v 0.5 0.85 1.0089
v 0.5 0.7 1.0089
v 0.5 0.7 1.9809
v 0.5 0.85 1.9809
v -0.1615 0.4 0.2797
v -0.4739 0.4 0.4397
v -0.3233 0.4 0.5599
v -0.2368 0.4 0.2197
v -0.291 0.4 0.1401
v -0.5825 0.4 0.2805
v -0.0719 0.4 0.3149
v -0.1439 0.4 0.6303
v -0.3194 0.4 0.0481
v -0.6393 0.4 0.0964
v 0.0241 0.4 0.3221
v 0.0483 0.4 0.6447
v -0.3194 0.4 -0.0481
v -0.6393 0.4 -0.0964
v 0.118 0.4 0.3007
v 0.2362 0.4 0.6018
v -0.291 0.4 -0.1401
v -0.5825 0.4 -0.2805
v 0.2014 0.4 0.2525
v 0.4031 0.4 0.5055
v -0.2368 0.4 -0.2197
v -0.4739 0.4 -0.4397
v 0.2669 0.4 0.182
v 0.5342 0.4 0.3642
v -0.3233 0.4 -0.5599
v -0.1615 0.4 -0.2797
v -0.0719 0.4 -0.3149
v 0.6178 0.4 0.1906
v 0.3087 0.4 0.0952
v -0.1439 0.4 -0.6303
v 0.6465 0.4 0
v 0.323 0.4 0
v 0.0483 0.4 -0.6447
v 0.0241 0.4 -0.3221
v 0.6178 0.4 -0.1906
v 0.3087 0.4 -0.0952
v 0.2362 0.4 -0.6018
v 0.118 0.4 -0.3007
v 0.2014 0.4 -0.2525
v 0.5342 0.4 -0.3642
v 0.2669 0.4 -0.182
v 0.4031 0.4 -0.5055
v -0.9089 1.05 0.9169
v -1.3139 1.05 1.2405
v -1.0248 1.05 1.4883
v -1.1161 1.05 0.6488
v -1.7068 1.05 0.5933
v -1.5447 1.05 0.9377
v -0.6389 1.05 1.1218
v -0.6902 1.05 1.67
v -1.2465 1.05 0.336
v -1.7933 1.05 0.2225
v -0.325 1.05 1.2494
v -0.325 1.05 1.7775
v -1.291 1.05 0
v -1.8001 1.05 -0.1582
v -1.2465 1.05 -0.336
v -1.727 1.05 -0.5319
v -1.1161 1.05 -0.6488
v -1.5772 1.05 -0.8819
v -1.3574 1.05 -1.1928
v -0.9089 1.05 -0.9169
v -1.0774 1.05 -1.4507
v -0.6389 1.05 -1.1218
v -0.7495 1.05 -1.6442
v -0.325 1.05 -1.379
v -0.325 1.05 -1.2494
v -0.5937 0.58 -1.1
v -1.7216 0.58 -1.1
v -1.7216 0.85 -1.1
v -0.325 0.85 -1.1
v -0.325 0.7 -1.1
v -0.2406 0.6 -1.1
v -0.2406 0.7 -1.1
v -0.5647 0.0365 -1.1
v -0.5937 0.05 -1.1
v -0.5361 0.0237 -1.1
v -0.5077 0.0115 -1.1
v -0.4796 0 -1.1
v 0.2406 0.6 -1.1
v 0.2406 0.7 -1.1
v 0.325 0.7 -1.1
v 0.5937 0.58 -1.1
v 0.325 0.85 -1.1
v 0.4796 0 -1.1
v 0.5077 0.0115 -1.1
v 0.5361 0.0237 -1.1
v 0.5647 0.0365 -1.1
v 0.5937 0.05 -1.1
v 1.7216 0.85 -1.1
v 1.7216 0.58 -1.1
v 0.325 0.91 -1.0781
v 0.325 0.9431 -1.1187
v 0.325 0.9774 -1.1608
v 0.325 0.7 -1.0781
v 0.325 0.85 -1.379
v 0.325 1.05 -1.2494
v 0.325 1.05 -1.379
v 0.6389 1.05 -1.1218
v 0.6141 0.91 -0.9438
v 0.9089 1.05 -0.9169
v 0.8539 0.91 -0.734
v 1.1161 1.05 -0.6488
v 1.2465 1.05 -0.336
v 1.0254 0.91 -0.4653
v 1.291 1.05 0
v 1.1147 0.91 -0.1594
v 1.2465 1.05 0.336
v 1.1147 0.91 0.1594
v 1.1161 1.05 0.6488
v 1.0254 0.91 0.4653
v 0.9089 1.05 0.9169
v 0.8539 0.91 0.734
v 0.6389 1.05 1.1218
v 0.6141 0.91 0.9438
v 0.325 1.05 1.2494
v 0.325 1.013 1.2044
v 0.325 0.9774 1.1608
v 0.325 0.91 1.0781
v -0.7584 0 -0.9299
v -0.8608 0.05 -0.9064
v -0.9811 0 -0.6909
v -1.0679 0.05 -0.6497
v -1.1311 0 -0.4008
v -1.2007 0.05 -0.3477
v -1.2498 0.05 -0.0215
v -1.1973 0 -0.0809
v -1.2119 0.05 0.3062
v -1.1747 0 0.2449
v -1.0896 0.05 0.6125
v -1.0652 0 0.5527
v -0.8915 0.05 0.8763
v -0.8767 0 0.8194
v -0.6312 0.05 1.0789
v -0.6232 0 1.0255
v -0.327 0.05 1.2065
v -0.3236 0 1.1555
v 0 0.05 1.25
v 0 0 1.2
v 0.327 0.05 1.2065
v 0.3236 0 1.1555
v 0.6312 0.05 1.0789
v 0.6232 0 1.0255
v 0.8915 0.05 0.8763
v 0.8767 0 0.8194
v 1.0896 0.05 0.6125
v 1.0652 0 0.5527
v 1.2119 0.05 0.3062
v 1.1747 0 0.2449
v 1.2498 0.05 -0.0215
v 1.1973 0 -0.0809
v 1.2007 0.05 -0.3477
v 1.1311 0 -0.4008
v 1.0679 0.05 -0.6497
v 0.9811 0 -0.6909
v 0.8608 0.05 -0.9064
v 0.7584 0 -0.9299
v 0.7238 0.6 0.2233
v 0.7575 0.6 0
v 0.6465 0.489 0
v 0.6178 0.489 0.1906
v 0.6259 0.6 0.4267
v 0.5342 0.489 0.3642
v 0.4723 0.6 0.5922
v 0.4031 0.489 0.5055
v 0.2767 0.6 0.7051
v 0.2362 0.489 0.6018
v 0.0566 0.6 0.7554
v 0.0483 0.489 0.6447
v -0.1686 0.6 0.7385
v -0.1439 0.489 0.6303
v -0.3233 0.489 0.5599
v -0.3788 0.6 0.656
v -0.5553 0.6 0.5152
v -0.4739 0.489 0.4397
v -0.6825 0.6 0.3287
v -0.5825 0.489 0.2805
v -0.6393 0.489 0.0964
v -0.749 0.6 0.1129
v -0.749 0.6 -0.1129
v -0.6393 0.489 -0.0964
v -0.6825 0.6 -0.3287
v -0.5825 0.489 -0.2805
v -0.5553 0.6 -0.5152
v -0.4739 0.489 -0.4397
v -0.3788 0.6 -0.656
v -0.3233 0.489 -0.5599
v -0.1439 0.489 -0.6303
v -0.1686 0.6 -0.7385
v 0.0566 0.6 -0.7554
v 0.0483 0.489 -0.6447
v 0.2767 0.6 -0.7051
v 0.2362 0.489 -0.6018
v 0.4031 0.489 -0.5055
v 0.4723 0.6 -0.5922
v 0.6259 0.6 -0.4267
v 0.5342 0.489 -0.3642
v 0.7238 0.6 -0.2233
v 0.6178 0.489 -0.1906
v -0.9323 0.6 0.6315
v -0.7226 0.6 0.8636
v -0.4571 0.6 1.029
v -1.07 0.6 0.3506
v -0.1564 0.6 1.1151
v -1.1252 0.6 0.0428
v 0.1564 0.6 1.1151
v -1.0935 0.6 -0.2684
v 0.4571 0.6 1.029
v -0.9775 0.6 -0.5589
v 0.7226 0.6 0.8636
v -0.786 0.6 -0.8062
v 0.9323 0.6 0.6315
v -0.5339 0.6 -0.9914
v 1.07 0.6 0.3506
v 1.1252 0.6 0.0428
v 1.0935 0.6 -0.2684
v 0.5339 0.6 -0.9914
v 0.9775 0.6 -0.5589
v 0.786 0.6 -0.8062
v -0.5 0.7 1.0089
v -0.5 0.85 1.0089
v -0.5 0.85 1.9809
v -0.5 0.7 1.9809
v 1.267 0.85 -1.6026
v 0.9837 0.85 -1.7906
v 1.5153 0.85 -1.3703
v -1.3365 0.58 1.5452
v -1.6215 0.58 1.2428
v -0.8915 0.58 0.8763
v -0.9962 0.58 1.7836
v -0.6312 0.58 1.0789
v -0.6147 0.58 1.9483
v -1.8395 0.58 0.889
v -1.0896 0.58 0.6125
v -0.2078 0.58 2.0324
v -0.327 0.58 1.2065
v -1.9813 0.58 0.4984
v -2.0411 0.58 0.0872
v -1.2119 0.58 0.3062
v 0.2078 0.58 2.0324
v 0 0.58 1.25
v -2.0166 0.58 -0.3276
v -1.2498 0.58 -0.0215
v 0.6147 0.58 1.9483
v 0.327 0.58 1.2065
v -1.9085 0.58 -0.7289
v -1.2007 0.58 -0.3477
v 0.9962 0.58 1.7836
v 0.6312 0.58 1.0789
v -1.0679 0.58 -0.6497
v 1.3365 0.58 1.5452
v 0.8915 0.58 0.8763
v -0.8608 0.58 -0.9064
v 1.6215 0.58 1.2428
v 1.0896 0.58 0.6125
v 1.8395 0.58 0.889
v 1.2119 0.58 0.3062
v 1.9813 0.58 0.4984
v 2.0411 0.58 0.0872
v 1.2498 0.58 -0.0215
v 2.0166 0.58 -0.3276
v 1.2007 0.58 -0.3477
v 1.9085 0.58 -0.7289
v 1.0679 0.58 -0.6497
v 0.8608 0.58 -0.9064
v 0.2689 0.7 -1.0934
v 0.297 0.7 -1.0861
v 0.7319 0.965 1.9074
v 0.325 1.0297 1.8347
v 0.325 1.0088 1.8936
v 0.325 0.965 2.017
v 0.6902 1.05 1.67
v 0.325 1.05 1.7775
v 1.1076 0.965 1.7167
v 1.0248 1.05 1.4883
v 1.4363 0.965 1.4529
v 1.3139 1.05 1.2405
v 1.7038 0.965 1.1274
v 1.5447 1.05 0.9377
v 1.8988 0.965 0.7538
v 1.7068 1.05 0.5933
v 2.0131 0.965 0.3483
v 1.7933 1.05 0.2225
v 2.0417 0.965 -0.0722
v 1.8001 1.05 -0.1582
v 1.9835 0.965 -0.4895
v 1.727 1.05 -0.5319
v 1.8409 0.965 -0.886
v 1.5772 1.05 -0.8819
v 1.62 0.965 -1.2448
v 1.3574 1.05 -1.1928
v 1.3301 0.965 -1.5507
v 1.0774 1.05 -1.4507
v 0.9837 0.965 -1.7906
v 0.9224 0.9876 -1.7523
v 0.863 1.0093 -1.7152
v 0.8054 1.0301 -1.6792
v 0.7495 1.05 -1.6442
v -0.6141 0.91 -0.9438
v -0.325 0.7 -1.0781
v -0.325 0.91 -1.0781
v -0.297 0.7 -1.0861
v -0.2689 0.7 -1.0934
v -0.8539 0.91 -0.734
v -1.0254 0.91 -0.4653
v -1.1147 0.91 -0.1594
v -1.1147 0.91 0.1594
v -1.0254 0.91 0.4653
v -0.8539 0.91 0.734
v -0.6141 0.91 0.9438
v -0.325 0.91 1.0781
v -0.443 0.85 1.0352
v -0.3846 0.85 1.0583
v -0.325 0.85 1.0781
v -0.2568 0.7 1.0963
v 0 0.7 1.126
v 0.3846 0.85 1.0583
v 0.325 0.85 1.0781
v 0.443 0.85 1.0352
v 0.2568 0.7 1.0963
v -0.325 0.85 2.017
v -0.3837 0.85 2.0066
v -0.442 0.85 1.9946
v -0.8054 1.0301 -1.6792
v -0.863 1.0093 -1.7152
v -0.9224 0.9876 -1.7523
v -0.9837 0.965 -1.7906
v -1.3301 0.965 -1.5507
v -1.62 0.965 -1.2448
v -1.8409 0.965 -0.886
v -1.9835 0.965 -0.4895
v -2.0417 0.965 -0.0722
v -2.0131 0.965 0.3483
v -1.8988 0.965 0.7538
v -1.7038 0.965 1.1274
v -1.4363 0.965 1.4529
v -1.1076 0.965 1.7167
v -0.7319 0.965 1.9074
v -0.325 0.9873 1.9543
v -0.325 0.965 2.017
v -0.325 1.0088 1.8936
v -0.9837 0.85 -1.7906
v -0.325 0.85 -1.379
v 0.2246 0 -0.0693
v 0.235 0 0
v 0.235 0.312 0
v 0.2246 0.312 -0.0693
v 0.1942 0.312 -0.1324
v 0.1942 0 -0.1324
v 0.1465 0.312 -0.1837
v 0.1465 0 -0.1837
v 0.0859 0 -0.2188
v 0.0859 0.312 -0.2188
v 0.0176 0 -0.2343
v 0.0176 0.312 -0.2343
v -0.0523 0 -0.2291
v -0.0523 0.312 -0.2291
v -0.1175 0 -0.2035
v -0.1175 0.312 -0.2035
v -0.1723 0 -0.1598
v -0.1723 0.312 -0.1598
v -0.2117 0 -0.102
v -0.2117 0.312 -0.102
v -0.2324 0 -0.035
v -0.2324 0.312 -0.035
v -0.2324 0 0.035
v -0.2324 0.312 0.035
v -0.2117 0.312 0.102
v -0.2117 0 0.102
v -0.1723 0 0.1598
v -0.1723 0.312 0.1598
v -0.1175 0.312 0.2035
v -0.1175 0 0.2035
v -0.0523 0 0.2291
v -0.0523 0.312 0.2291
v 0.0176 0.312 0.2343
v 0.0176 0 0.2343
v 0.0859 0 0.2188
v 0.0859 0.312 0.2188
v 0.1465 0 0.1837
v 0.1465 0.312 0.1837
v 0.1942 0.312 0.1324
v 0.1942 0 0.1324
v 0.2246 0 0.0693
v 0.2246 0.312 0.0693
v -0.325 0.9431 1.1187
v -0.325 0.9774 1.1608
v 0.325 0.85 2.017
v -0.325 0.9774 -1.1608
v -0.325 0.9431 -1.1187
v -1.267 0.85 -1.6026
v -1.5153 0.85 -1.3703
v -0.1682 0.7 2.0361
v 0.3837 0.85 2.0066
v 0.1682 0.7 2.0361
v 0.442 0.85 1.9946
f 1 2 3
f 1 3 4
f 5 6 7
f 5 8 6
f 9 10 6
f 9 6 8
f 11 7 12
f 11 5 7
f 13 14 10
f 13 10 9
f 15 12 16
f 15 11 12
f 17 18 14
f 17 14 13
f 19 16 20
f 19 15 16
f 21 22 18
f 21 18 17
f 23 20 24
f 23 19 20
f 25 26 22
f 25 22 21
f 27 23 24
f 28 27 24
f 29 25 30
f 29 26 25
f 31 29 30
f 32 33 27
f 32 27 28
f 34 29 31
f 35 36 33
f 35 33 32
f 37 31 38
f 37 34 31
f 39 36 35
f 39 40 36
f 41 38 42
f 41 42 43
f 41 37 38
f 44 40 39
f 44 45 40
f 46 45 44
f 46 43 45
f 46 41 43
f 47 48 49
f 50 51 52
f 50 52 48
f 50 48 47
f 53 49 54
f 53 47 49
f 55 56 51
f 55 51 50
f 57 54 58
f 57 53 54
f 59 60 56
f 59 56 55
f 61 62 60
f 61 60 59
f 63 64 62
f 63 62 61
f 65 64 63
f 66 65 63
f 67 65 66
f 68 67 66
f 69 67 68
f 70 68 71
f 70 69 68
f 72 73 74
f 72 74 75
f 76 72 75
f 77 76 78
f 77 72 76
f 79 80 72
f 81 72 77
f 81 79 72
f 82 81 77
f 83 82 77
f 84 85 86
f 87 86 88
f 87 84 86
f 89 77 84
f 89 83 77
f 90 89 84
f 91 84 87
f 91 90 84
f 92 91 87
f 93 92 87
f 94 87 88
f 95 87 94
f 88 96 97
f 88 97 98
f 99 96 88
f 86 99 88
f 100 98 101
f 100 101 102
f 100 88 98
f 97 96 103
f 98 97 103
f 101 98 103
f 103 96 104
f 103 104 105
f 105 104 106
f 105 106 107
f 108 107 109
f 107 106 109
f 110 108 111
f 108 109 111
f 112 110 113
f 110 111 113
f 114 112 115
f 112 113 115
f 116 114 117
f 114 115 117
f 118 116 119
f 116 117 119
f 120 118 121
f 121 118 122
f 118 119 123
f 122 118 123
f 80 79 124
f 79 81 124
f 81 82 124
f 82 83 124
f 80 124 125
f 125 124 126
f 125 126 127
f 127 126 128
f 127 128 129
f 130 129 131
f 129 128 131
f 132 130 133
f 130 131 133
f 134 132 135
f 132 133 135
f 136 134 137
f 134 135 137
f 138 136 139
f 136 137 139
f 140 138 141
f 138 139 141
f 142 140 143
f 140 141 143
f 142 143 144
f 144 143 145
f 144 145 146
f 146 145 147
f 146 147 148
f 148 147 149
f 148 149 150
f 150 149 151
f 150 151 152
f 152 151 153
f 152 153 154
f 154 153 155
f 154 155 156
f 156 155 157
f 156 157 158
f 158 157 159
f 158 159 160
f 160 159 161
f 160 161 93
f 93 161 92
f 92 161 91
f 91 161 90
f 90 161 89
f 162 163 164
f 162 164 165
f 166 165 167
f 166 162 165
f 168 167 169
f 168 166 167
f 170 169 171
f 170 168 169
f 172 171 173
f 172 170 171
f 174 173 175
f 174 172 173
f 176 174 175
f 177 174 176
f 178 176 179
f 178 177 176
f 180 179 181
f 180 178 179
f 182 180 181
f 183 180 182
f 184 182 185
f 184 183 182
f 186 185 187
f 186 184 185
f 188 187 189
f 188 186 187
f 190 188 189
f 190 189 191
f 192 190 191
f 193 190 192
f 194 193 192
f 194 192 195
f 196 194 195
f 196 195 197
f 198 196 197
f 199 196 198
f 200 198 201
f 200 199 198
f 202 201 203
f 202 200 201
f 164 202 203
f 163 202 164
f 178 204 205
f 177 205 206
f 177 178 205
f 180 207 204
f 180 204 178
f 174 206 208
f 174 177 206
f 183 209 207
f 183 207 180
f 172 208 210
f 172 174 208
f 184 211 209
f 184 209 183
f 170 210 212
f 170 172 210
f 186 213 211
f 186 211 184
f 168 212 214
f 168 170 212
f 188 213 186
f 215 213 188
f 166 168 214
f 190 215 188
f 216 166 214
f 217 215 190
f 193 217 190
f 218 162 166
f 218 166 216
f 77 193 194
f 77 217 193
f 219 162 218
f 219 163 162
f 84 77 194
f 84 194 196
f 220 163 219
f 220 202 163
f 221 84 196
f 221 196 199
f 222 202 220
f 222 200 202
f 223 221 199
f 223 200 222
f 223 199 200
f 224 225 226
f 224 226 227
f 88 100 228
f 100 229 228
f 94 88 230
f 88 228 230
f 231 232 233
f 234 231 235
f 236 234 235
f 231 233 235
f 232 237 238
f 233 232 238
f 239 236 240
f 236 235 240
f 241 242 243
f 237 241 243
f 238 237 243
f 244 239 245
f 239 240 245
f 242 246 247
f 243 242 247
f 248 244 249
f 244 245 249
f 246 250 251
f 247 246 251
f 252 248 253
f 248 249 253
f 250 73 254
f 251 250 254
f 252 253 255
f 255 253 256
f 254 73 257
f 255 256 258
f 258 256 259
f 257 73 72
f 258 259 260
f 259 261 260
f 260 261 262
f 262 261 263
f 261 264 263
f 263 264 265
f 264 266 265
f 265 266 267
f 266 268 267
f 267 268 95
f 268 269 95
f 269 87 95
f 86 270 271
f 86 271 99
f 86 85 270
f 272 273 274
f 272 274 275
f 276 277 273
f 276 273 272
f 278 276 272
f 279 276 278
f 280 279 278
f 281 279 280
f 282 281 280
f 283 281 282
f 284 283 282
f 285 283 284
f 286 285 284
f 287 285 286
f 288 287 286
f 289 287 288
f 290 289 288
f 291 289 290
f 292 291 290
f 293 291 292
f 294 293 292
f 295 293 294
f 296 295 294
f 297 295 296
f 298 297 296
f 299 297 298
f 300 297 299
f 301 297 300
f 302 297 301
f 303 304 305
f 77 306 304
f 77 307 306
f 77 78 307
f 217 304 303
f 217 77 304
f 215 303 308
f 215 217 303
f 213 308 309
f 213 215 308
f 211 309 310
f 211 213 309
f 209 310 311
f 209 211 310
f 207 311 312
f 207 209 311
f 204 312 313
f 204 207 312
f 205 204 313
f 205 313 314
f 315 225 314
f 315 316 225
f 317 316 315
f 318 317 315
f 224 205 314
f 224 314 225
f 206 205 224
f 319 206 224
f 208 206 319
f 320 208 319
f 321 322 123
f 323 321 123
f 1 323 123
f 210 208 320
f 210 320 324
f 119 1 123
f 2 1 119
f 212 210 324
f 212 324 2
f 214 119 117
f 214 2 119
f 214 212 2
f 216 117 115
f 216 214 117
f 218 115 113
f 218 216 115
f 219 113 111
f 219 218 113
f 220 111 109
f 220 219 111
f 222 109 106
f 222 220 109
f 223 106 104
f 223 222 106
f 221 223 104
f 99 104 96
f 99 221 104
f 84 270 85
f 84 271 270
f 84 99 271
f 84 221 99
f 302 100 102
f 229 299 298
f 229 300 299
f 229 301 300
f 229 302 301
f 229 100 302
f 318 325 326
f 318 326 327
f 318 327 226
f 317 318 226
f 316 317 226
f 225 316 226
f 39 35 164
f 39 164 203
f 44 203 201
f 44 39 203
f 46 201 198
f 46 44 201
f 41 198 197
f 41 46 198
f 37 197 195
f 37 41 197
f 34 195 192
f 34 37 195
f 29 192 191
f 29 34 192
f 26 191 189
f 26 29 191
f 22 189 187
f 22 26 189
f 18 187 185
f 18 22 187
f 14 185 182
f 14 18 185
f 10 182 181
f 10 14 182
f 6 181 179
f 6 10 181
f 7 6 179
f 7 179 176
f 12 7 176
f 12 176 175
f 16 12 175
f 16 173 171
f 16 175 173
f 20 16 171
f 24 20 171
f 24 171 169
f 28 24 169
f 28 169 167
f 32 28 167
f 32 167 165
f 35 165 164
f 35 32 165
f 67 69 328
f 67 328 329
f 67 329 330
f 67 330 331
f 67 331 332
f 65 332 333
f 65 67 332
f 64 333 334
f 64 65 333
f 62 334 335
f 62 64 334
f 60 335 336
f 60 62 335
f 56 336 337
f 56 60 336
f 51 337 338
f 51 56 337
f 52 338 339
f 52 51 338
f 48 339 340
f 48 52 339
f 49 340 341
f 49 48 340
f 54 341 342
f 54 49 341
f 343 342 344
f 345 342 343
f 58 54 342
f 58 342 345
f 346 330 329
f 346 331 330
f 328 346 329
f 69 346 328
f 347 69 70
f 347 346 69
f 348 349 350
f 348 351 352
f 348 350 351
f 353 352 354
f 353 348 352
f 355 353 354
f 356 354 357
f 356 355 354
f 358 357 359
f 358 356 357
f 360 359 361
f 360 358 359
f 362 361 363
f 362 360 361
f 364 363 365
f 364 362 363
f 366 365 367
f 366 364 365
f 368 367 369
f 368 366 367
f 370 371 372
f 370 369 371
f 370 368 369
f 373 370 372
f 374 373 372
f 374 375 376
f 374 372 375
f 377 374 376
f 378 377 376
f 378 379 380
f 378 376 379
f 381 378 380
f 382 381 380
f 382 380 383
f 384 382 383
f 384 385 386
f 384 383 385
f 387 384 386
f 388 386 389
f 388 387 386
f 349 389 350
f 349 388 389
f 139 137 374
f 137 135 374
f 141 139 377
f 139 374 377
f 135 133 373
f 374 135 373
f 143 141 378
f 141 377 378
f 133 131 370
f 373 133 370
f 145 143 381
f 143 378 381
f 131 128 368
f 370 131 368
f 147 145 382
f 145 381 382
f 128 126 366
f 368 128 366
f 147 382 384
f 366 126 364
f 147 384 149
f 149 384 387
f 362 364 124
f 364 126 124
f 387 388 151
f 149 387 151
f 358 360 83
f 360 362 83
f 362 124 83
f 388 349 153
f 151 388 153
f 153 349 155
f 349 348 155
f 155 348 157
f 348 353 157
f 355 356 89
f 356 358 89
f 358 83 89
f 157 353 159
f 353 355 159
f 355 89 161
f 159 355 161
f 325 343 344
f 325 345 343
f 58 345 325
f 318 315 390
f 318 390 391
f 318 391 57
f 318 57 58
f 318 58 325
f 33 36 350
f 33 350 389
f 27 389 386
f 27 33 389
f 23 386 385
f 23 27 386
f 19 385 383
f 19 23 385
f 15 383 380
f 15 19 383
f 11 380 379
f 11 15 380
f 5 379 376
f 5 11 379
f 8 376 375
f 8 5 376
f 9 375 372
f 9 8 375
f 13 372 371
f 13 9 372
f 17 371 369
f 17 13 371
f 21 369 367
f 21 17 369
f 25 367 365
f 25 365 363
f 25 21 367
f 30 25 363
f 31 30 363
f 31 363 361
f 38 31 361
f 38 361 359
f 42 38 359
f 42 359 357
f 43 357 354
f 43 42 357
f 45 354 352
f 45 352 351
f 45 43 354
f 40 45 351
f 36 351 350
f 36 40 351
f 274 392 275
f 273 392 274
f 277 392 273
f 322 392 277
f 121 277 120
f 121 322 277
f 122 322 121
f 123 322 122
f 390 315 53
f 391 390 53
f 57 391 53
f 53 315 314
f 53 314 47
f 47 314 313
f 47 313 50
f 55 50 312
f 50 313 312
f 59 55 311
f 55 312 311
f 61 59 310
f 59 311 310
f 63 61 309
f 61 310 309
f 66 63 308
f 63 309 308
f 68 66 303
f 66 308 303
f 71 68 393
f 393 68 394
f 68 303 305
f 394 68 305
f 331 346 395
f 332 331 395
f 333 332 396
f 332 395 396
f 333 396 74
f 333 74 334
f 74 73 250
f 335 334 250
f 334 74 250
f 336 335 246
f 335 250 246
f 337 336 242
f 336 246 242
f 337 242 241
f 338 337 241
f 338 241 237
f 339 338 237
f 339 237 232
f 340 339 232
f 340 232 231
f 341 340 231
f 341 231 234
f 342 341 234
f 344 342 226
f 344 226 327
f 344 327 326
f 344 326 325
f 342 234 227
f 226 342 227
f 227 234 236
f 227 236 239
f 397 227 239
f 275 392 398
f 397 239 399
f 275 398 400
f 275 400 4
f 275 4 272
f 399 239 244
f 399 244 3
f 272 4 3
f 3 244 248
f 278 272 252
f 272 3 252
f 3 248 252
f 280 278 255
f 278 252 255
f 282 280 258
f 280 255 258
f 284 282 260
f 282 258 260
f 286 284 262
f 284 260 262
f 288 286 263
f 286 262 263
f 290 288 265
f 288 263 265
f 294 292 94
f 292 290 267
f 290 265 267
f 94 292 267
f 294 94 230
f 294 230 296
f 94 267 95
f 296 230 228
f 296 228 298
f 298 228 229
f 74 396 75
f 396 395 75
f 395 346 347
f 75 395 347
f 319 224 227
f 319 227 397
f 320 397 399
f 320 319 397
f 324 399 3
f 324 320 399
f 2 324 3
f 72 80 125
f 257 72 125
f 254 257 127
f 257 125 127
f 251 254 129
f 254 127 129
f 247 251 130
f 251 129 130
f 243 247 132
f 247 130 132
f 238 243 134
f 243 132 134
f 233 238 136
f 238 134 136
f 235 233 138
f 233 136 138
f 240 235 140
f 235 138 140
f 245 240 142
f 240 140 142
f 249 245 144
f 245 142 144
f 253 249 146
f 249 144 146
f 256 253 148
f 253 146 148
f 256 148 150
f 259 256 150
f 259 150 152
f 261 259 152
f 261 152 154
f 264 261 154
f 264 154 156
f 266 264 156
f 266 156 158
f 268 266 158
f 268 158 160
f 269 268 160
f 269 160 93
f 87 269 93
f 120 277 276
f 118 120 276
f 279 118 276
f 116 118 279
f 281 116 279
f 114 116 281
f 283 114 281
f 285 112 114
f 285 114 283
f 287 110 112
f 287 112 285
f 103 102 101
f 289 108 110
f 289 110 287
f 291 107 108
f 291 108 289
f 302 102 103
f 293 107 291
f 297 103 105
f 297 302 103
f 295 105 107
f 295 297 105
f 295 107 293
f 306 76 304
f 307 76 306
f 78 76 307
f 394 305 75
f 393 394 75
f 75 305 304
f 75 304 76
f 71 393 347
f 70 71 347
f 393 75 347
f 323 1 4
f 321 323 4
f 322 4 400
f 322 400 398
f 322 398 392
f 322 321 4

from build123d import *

# Parameters (mm, degrees)
SKETCH1_R           = 1.25
BOSS_EXTRUDE1_DEPTH = 0.58
SKETCH2_R           = 2.043
BOSS_EXTRUDE2_DEPTH = 0.47
CUT_EXTRUDE1_REACH  = 3.45
CUT_EXTRUDE1_START  = 0.4
SKETCH3_R           = 0.6465
CUT_EXTRUDE2_REACH  = 3.65
CUT_EXTRUDE2_START  = 0.6
SKETCH4_R           = 1.126
CUT_EXTRUDE3_REACH  = 3.05
SKETCH5_R           = 0.235
CHAMFER1_SIZE       = 0.05
CHAMFER2_SIZE       = 0.088
CHAMFER3_SIZE       = 0.111
CHAMFER4_SIZE       = 0.165
CHAMFER4_SIZE2      = 0.14
CHAMFER5_SIZE       = 0.085
CHAMFER5_SIZE2      = 0.236
CUT_EXTRUDE4_REACH  = 4.043
CUT_EXTRUDE5_REACH  = 2.45
SKETCH8_W           = 0.48
SKETCH8_H           = 1.704544177
SKETCH9_W           = 0.65
SKETCH9_H           = 1.293267811
CUT_EXTRUDE6_DEPTH  = 0.35
SKETCH10_W          = 5.093485532
SKETCH10_H          = 1.197948417
CUT_EXTRUDE7_DEPTH  = 0.85
CUT_EXTRUDE8_DEPTH  = 2.05


with BuildPart() as part:
    # Sketch1 → Boss-Extrude1 (new body)
    with BuildSketch(Plane(origin=(0, 0, 0), x_dir=(1, 0, 0), z_dir=(0, 1, 0))):
        Circle(SKETCH1_R)
    extrude(amount=BOSS_EXTRUDE1_DEPTH)

    # Sketch2 → Boss-Extrude2 (add)
    with BuildSketch(Plane(origin=(0, 0.58, 0), x_dir=(1, 0, 0), z_dir=(0, 1, 0))):
        Circle(SKETCH2_R)
    extrude(amount=BOSS_EXTRUDE2_DEPTH)

    # Sketch3 → Cut-Extrude1 (cut, up to next)
    with BuildSketch(Plane(origin=(0, 0, 0), x_dir=(1, 0, 0), z_dir=(0, 1, 0)).offset(CUT_EXTRUDE1_START), mode=Mode.PRIVATE) as cut_extrude1_sk1:
        Circle(SKETCH3_R)
    cut_extrude1_tool1 = extrude(cut_extrude1_sk1.sketch, amount=CUT_EXTRUDE1_REACH, mode=Mode.PRIVATE) & part.part
    add(cut_extrude1_tool1.solids().sort_by_distance((0, 0.4, 0))[0], mode=Mode.SUBTRACT)

    # Sketch4 → Cut-Extrude2 (cut, up to next)
    with BuildSketch(Plane(origin=(0, 0, 0), x_dir=(1, 0, 0), z_dir=(0, 1, 0)).offset(CUT_EXTRUDE2_START), mode=Mode.PRIVATE) as cut_extrude2_sk1:
        Circle(SKETCH4_R)
    cut_extrude2_tool1 = extrude(cut_extrude2_sk1.sketch, amount=CUT_EXTRUDE2_REACH, mode=Mode.PRIVATE) & part.part
    add(cut_extrude2_tool1.solids().sort_by_distance((0, 0.6, 0))[0], mode=Mode.SUBTRACT)

    # Sketch5 → Cut-Extrude3 (cut, up to next)
    with BuildSketch(Plane(origin=(0, 0, 0), x_dir=(1, 0, 0), z_dir=(0, 1, 0)), mode=Mode.PRIVATE) as cut_extrude3_sk1:
        Circle(SKETCH5_R)
    cut_extrude3_tool1 = extrude(cut_extrude3_sk1.sketch, amount=CUT_EXTRUDE3_REACH, mode=Mode.PRIVATE) & part.part
    add(cut_extrude3_tool1.solids().sort_by_distance((0, 0, 0))[0], mode=Mode.SUBTRACT)

    # Chamfer1
    chamfer1_edges = [part.edges().sort_by_distance(p)[0] for p in [
        (-1.25, 0, 0),
    ]]
    chamfer(chamfer1_edges, length=CHAMFER1_SIZE)

    # Chamfer2
    chamfer2_edges = [part.edges().sort_by_distance(p)[0] for p in [
        (-0.235, 0.4, 0),
    ]]
    chamfer(chamfer2_edges, length=CHAMFER2_SIZE)

    # Chamfer3
    chamfer3_edges = [part.edges().sort_by_distance(p)[0] for p in [
        (-0.6465, 0.6, 0),
    ]]
    chamfer(chamfer3_edges, length=CHAMFER3_SIZE)

    # Chamfer4
    chamfer4_edges = [part.edges().sort_by_distance(p)[0] for p in [
        (-1.126, 1.05, 0),
    ]]
    chamfer4_side = [part.faces().sort_by_distance(p)[0] for p in [
        (-1.985215234, 1.05, 0),
    ]]
    chamfer(chamfer4_edges, length=CHAMFER4_SIZE, length2=CHAMFER4_SIZE2, reference=chamfer4_side[0])

    # Chamfer5
    chamfer5_edges = [part.edges().sort_by_distance(p)[0] for p in [
        (-2.043, 1.05, 0),
    ]]
    chamfer5_side = [part.faces().sort_by_distance(p)[0] for p in [
        (-2.043, 0.815, 0),
    ]]
    chamfer(chamfer5_edges, length=CHAMFER5_SIZE, length2=CHAMFER5_SIZE2, reference=chamfer5_side[0])

    # Sketch7 → Cut-Extrude4 (cut, up to next)
    with BuildSketch(Plane.XY, mode=Mode.PRIVATE) as cut_extrude4_sk1:
        Polygon((-0.325, 1.220261845), (-0.325, 0.85), (-0.5, 0.85), (-0.5, 0.7), (0.5, 0.7), (0.5, 0.85), (0.325, 0.85), (0.325, 1.220261845), align=None)
    cut_extrude4_tool1 = extrude(cut_extrude4_sk1.sketch, amount=CUT_EXTRUDE4_REACH, mode=Mode.PRIVATE) & part.part
    add(cut_extrude4_tool1.solids().sort_by_distance((0, 0.935252, 0))[0], mode=Mode.SUBTRACT)

    # Sketch8 → Cut-Extrude5 (cut, up to next)
    with BuildSketch(Plane(origin=(0, 0.6, 0), x_dir=(1, 0, 0), z_dir=(0, 1, 0)), mode=Mode.PRIVATE) as cut_extrude5_sk1:
        with Locations((0, 1.786577137)):
            Rectangle(SKETCH8_W, SKETCH8_H)
    cut_extrude5_tool1 = extrude(cut_extrude5_sk1.sketch, amount=CUT_EXTRUDE5_REACH, mode=Mode.PRIVATE) & part.part
    add(cut_extrude5_tool1.solids().sort_by_distance((0, 0.6, -1.786577))[0], mode=Mode.SUBTRACT)

    # Sketch9 → Cut-Extrude6 (cut)
    with BuildSketch(Plane(origin=(0, 0.7, 0), x_dir=(1, 0, 0), z_dir=(0, 1, 0))):
        with Locations((0, 1.604554183)):
            Rectangle(SKETCH9_W, SKETCH9_H)
    extrude(amount=CUT_EXTRUDE6_DEPTH, mode=Mode.SUBTRACT)

    # Sketch10 → Cut-Extrude7 (cut)
    with BuildSketch(Plane(origin=(0, 0, 0), x_dir=(1, 0, 0), z_dir=(0, 1, 0))):
        with Locations((-0.004402354, 1.698974209)):
            Rectangle(SKETCH10_W, SKETCH10_H)
    extrude(amount=CUT_EXTRUDE7_DEPTH, mode=Mode.SUBTRACT)

    # Sketch11 → Cut-Extrude8 (cut, through all)
    with BuildSketch(Plane(origin=(0, 0, 0), x_dir=(1, 0, 0), z_dir=(0, 1, 0))):
        Polygon((-1.831685312, 2.320481475), (0, 1.175917461), (1.831685312, 2.320481475), align=None)
    extrude(amount=CUT_EXTRUDE8_DEPTH, mode=Mode.SUBTRACT)


solid = part.part
